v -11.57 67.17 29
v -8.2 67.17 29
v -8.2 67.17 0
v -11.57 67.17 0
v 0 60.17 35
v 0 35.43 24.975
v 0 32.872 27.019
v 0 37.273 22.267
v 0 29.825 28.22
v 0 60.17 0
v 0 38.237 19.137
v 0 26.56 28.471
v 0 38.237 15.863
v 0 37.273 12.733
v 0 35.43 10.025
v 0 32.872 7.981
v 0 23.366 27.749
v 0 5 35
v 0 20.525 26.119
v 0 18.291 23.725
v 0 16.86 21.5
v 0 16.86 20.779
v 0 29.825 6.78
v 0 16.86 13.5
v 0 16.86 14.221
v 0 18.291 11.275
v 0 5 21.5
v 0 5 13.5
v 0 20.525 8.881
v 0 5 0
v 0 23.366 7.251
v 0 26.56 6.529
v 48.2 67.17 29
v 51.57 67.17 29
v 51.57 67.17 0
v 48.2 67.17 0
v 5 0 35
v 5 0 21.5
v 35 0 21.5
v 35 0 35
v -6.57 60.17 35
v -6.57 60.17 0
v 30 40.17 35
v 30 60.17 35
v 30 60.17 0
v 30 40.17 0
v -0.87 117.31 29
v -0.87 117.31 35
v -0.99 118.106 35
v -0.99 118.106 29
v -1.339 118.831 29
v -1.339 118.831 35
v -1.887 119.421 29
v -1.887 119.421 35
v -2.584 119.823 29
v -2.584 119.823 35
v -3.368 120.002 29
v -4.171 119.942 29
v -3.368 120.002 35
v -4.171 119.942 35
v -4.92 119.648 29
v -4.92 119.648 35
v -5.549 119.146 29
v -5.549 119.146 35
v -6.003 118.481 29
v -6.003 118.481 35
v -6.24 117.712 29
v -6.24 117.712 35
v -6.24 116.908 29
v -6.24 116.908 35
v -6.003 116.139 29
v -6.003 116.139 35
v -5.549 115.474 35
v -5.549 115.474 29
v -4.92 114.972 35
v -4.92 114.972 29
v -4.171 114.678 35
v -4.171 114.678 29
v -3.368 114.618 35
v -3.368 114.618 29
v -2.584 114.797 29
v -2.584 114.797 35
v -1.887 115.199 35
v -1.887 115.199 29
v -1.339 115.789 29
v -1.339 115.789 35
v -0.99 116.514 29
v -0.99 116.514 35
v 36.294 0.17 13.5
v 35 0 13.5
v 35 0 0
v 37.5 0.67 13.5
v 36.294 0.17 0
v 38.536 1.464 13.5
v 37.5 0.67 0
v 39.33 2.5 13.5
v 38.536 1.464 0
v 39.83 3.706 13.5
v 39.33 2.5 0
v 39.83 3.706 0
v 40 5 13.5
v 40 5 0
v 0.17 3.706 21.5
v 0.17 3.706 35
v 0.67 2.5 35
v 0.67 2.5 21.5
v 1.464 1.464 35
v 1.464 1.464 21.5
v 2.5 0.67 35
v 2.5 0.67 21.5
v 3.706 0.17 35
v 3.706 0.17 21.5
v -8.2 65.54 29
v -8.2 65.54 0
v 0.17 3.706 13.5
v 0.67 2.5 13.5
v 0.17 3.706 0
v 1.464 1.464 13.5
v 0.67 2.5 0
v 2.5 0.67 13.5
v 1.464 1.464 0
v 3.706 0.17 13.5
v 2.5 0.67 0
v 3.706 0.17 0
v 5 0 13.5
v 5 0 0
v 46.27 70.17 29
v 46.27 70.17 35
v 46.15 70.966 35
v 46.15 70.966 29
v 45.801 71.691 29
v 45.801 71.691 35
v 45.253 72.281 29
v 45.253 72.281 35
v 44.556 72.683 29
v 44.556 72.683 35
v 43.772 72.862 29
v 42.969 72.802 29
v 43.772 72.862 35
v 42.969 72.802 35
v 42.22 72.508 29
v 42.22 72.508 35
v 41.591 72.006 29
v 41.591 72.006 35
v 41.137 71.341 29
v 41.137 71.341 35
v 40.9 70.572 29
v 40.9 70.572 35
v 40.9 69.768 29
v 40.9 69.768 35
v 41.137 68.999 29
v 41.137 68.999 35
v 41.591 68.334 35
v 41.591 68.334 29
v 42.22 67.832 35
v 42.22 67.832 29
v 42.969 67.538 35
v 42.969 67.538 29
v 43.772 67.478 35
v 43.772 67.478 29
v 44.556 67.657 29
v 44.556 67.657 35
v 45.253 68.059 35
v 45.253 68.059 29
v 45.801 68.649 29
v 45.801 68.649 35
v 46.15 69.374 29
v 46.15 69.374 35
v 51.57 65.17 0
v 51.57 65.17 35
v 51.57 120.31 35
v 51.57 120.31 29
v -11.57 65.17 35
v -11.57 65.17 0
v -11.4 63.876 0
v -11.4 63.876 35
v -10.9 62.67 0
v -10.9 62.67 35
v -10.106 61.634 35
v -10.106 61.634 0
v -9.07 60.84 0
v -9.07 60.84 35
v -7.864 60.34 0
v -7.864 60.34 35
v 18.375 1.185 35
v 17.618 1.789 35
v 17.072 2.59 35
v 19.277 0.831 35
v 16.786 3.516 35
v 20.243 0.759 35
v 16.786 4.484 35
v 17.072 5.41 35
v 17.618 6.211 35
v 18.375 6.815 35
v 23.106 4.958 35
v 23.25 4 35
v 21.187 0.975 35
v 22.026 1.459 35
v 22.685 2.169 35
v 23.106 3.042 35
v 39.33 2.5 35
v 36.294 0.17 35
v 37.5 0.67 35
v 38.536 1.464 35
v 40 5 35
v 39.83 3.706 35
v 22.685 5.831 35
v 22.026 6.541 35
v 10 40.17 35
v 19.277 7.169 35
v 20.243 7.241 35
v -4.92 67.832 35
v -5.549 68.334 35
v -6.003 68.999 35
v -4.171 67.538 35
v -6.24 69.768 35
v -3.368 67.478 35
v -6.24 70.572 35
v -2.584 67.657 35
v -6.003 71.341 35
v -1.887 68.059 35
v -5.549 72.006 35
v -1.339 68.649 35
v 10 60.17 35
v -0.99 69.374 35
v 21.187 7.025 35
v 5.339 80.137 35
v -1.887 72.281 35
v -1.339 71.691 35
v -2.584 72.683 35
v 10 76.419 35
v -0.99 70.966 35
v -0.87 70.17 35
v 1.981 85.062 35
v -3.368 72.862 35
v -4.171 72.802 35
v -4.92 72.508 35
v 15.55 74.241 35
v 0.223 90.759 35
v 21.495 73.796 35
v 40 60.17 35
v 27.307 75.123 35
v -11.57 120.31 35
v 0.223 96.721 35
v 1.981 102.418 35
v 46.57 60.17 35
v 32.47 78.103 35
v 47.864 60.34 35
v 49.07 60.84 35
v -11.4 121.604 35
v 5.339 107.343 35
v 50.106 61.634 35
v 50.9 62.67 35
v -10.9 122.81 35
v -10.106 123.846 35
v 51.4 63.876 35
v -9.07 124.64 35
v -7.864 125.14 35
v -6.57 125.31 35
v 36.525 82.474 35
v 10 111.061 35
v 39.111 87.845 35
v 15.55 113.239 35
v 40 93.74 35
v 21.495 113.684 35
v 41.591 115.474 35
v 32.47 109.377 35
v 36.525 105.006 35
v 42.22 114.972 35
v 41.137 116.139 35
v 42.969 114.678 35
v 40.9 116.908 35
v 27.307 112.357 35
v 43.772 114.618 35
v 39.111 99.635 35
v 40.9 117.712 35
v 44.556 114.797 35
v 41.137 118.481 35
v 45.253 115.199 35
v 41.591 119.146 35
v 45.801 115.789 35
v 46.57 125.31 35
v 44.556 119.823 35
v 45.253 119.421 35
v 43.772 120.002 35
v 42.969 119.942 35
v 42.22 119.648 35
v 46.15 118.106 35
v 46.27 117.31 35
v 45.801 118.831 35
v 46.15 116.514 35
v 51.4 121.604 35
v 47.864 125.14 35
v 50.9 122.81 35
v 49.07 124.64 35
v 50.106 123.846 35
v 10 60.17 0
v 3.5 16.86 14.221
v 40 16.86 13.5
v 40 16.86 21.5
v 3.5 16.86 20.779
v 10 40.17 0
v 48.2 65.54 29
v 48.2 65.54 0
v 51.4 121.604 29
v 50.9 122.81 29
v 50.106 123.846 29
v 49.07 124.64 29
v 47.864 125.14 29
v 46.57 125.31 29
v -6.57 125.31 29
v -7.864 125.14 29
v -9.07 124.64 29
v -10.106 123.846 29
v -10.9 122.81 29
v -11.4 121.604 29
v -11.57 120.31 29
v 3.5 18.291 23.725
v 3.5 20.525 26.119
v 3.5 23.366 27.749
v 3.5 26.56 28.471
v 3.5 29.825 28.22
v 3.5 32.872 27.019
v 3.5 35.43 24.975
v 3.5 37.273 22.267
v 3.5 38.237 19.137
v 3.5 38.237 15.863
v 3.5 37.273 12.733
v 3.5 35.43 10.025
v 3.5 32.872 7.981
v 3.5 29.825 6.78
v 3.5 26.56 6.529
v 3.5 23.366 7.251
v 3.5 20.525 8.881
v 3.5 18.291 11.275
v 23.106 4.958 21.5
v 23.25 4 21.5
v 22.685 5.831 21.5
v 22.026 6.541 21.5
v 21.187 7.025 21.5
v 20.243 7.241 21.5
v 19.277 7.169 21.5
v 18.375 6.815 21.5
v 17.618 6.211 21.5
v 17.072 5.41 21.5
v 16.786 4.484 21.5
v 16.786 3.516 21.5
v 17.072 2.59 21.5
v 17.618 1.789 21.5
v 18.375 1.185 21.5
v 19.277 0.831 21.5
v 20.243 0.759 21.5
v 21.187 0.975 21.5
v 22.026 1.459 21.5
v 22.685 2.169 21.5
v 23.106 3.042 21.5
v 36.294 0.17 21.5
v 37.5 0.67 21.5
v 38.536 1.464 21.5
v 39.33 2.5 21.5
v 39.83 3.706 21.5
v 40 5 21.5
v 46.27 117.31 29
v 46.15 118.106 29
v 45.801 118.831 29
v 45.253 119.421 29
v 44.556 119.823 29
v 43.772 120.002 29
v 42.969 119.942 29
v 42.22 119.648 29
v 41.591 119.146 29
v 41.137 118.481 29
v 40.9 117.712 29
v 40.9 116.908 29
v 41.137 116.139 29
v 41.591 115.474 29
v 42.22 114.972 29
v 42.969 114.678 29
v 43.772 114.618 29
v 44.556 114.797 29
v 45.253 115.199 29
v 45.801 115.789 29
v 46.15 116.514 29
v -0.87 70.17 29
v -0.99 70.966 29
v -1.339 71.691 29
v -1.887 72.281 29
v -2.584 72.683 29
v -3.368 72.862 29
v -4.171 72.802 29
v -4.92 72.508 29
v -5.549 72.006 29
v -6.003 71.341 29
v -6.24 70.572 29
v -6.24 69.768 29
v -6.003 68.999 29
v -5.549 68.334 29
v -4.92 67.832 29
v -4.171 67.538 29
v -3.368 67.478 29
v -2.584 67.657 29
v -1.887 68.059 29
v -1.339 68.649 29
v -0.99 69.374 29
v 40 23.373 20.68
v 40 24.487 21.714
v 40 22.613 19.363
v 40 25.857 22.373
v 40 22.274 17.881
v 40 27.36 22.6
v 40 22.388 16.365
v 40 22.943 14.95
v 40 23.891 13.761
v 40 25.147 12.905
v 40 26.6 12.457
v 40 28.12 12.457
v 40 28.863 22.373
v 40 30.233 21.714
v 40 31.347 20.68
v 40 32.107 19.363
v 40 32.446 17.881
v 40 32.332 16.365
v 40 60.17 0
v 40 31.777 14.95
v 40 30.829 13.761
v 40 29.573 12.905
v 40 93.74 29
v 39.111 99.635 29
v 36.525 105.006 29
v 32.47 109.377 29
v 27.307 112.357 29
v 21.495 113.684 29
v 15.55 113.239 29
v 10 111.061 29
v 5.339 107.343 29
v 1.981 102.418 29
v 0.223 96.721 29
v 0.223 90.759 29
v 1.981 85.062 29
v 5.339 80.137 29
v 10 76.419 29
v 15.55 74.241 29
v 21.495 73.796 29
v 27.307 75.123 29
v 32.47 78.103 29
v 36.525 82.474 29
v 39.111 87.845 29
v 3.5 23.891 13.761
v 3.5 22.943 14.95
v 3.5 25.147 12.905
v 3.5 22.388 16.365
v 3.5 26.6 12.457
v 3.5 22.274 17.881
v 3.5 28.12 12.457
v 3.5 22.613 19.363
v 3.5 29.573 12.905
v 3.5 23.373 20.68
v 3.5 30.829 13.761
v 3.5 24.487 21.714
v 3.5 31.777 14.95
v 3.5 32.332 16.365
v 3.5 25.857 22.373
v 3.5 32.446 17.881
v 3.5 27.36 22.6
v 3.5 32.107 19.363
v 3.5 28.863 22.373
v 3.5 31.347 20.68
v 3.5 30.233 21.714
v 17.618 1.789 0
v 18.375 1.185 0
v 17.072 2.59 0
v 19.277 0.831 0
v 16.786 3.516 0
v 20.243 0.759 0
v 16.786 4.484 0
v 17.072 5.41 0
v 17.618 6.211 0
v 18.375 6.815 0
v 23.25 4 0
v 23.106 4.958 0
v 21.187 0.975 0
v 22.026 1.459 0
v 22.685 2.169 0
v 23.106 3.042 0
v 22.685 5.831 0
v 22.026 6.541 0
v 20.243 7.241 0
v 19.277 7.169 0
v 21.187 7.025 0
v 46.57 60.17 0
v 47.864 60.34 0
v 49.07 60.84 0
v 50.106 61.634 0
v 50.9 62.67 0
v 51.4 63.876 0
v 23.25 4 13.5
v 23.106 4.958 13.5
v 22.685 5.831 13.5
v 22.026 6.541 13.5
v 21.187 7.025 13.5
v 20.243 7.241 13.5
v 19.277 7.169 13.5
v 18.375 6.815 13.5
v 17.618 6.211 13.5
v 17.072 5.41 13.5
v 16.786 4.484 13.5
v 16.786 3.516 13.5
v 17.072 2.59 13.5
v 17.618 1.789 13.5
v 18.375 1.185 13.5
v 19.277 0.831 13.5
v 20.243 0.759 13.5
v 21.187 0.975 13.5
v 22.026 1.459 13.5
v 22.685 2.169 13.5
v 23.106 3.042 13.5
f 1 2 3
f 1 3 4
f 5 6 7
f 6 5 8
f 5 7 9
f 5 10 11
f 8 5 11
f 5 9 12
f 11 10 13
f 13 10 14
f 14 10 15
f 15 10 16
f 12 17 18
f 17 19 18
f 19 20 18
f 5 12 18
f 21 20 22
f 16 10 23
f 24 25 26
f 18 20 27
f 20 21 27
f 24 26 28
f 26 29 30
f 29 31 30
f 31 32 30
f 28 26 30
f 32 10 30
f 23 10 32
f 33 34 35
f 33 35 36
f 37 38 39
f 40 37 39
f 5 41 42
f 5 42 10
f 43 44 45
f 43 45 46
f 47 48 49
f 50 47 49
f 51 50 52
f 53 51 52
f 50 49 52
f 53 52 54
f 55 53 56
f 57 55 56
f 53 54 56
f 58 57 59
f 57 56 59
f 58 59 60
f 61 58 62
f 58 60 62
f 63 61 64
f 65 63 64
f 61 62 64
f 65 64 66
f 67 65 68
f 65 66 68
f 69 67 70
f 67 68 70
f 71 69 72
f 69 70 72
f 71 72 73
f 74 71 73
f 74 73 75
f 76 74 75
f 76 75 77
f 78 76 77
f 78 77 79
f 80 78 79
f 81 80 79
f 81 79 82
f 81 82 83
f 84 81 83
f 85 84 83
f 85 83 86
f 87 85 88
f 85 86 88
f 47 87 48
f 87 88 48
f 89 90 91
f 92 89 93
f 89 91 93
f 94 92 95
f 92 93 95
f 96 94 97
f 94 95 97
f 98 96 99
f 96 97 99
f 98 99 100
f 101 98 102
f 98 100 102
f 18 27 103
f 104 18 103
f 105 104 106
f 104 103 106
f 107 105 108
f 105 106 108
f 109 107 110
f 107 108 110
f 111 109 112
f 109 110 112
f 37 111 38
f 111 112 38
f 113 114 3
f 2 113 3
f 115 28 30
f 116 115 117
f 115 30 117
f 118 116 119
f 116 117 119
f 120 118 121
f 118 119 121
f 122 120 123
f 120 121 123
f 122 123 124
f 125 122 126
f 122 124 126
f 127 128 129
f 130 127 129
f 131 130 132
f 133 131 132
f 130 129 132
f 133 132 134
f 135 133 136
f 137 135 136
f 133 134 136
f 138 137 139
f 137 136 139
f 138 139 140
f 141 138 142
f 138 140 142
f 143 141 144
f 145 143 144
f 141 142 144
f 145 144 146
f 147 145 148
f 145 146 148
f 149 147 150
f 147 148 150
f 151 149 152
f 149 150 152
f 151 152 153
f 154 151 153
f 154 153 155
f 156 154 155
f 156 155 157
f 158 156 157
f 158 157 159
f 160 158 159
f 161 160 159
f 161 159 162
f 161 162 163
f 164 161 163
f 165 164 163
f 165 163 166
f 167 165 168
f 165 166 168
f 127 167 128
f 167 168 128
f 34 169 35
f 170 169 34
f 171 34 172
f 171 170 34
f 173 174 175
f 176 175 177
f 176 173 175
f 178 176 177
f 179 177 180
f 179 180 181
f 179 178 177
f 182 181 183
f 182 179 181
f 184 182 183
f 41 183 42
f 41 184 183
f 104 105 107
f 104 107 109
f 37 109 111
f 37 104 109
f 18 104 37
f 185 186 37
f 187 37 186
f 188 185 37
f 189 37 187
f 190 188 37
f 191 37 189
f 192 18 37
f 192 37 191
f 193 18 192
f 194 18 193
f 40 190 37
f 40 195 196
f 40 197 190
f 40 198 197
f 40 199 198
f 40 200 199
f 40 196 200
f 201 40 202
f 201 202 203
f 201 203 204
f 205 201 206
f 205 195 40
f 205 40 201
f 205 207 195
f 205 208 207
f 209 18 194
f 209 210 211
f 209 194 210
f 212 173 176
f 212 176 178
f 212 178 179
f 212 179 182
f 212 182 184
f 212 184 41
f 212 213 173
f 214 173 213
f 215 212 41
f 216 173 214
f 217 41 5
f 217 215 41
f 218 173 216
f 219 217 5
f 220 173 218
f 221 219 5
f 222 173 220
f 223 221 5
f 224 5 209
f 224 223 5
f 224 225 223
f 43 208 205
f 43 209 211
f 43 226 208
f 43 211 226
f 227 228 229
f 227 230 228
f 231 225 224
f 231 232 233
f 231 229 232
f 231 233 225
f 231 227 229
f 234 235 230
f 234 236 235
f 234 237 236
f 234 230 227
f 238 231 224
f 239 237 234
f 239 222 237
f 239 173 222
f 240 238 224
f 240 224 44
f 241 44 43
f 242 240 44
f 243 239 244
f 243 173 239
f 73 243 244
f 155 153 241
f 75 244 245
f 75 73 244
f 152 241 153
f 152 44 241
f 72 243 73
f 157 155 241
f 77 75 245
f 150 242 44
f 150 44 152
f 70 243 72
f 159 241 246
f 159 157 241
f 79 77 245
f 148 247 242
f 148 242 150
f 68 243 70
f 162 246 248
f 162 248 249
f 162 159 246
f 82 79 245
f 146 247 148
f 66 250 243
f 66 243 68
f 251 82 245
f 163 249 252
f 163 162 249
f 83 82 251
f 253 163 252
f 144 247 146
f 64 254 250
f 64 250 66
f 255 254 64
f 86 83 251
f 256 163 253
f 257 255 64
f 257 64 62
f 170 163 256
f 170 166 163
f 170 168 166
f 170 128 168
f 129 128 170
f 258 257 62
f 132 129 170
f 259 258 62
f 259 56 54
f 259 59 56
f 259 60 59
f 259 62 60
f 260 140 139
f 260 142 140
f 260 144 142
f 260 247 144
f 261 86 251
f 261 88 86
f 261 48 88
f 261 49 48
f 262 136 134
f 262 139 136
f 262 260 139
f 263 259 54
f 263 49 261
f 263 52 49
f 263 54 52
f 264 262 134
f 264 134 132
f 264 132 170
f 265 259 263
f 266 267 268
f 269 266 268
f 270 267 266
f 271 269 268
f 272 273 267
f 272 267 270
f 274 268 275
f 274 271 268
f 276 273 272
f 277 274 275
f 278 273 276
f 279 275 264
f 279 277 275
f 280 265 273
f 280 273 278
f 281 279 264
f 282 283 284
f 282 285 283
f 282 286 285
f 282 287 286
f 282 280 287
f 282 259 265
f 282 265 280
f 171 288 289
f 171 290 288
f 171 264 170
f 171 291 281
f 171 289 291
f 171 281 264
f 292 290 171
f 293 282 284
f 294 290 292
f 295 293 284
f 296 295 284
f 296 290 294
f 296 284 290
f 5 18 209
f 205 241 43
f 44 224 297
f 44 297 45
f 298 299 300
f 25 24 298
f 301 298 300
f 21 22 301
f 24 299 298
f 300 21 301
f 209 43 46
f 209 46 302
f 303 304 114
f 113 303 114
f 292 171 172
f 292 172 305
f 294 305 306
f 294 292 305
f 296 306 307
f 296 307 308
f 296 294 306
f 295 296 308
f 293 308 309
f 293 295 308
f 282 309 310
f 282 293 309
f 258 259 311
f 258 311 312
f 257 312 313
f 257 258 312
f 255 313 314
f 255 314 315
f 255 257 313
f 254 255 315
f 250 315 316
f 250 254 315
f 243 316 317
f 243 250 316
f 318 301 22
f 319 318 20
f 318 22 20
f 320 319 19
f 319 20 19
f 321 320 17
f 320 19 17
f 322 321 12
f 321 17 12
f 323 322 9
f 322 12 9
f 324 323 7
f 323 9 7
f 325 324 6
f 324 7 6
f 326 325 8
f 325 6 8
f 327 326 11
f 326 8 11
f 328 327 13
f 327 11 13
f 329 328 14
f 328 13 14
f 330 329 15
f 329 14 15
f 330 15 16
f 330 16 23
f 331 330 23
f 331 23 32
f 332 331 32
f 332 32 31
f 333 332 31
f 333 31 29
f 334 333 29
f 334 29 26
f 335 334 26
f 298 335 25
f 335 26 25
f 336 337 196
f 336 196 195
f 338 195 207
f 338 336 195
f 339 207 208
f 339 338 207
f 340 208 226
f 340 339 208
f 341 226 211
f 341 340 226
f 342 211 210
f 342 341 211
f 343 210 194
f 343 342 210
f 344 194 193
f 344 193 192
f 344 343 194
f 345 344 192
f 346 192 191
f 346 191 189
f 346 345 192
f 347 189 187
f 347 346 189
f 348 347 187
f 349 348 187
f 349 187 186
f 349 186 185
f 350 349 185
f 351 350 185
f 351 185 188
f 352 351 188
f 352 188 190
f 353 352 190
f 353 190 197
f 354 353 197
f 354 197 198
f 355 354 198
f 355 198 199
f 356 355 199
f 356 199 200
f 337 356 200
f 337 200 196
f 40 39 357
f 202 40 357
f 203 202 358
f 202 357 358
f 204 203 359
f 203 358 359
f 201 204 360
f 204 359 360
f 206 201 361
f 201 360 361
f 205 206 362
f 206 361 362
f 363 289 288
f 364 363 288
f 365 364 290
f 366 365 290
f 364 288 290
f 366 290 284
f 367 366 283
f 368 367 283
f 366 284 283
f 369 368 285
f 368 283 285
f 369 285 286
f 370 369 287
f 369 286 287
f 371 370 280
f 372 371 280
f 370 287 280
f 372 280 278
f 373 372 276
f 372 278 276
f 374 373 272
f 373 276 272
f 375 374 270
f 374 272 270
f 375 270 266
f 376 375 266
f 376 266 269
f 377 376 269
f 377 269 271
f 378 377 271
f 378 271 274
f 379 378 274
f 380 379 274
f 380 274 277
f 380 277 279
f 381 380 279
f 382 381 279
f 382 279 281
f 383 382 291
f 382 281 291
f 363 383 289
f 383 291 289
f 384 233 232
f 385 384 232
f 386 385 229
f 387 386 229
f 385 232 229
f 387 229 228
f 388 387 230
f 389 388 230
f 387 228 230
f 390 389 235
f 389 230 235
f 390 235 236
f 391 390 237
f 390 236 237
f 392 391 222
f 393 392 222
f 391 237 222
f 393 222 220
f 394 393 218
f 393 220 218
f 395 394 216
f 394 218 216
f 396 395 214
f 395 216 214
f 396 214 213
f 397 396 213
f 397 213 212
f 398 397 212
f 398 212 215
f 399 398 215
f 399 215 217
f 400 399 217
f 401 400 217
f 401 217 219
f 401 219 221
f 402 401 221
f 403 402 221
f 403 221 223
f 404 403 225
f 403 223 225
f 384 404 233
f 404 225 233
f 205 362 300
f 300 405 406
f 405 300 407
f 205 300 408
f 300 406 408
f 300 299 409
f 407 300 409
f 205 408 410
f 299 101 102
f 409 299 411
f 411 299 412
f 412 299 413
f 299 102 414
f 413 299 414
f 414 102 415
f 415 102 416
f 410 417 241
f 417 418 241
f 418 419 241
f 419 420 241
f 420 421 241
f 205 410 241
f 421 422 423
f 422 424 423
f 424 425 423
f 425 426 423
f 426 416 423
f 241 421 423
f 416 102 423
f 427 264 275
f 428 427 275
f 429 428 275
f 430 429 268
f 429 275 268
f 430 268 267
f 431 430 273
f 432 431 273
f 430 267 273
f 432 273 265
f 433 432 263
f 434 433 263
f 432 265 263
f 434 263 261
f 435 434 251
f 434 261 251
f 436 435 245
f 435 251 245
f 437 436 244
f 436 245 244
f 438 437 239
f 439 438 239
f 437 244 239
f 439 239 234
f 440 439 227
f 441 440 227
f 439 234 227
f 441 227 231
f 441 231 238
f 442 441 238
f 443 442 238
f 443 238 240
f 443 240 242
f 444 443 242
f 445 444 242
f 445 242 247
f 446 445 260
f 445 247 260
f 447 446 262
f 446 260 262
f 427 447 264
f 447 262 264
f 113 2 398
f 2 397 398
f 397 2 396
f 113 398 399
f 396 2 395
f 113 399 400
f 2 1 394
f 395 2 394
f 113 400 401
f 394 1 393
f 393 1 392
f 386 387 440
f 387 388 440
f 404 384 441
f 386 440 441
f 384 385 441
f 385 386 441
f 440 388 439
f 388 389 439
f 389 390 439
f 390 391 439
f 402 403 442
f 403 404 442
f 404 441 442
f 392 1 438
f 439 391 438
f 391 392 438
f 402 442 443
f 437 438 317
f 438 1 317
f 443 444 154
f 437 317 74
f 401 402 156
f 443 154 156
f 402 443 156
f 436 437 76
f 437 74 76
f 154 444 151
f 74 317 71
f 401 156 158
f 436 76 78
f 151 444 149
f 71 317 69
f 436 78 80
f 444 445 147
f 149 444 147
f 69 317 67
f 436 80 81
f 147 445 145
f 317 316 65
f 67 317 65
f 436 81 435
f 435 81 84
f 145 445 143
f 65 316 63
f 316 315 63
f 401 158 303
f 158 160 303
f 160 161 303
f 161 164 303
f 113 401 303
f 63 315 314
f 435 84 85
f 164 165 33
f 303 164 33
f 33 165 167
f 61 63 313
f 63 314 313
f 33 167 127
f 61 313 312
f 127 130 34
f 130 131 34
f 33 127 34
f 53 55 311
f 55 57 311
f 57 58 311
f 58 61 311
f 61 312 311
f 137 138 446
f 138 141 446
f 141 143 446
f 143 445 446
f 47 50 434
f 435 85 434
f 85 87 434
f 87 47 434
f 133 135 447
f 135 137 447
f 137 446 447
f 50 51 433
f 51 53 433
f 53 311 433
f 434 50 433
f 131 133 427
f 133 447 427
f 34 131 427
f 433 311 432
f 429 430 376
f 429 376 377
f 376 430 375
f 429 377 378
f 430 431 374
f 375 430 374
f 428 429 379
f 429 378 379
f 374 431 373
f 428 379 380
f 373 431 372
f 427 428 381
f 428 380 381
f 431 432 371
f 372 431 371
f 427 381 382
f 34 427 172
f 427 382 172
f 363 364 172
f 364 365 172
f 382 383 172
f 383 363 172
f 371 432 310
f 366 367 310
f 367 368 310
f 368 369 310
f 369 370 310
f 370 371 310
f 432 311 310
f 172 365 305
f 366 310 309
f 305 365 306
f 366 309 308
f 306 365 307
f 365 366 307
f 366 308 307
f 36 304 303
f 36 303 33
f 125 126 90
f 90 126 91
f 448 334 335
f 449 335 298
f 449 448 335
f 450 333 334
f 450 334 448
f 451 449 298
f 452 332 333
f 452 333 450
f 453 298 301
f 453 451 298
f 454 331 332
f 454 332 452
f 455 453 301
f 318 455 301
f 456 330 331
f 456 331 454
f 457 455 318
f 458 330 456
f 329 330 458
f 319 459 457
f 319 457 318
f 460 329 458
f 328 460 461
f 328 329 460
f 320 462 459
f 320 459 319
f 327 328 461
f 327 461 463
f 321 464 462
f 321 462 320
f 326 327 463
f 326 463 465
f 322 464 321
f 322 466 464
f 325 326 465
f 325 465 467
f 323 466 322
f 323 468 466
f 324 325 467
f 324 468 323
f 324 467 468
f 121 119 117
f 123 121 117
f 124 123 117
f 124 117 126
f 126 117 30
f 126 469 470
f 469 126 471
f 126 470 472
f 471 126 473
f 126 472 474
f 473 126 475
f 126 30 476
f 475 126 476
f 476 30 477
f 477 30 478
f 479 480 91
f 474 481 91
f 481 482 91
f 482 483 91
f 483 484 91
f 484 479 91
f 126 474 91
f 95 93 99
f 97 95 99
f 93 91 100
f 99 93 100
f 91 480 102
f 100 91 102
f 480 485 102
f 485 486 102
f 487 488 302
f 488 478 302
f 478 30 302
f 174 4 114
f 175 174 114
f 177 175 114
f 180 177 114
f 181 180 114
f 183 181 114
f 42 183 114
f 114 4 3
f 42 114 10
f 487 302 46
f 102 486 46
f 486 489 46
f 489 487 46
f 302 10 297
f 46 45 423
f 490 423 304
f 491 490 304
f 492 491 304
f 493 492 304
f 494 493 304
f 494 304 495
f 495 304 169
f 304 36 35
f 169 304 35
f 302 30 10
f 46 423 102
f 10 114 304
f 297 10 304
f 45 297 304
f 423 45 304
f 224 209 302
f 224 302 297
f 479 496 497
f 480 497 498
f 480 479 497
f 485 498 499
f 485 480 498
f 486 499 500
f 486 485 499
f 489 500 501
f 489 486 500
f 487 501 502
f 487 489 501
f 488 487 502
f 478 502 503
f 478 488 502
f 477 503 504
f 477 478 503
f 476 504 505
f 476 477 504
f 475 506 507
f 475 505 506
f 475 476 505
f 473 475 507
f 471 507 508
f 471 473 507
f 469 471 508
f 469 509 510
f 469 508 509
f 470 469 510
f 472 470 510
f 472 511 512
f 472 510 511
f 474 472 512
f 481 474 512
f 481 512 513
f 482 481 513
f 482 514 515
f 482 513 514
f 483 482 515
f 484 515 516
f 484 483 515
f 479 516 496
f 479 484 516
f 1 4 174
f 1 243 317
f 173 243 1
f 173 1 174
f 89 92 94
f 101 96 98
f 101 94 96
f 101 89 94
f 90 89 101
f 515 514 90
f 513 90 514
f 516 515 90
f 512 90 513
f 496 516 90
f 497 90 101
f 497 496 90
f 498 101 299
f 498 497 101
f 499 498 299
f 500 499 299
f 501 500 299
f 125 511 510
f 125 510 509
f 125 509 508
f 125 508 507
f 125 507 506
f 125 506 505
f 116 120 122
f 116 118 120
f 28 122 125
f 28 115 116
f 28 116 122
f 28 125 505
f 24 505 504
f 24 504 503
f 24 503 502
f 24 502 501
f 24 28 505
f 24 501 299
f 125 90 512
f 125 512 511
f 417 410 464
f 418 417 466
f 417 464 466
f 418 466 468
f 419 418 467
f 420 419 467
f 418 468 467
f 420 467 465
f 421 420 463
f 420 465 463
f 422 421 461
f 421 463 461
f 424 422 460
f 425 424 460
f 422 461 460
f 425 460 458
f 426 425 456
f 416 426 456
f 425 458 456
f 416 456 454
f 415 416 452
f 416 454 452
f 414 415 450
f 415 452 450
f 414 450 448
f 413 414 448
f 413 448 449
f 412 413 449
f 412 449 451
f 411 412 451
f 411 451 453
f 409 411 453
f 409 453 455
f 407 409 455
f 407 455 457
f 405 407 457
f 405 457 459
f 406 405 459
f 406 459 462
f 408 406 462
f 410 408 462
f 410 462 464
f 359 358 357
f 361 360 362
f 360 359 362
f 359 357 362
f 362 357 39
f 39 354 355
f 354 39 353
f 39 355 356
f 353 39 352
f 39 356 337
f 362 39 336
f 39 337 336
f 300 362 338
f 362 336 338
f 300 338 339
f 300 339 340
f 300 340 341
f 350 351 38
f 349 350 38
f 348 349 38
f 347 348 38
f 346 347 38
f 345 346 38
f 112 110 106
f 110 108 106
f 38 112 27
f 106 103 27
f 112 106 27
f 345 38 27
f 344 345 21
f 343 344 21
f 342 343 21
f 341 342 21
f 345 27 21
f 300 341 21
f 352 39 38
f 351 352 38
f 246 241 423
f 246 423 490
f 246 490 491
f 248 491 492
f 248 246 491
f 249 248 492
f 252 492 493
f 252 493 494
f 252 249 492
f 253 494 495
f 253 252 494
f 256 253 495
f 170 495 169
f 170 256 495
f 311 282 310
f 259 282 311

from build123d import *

# Parameters (mm, degrees)
CROQUIS1_R                   = 3.25
SALIENTE_EXTRUIR1_DEPTH      = 35
CROQUIS3_R                   = 5.1
CROQUIS3_W                   = 8
CROQUIS3_H                   = 16.86
CORTAR_EXTRUIR2_DEPTH        = 85.095950556
CROQUIS4_R                   = 11
CORTAR_EXTRUIR3_DEPTH        = 3.5
CROQUIS5_R                   = 20
CROQUIS5_R_2                 = 2.7
SALIENTE_EXTRUIR3_DEPTH      = 6
SALIENTE_EXTRUIR5_DEPTH      = 29
SALIENTE_EXTRUIR5_DEPTH_BACK = 6
CROQUIS9_W                   = 56.4
CROQUIS9_H                   = 56.4
CORTAR_EXTRUIR4_DEPTH        = 29


with BuildPart() as part:
    # Croquis1 → Saliente-Extruir1 (new body)
    # profile 1 of 2: a face of its own
    with BuildSketch(Plane.XY):
        with BuildLine():
            Line((0, 60.17), (0, 40.17))
            Line((0, 40.17), (10, 40.17))
            Line((10, 40.17), (10, 60.17))
            Line((10, 60.17), (30, 60.17))
            Line((30, 60.17), (30, 40.17))
            Line((30, 40.17), (40, 40.17))
            Line((40, 40.17), (40, 60.17))
            ThreePointArc((40, 60.17), (38.535533906, 63.705533906), (35, 65.17))
            Line((35, 65.17), (5, 65.17))
            ThreePointArc((5, 65.17), (1.464466094, 63.705533906), (0, 60.17))
        make_face()
    # profile 2 of 2: a face of its own
    with BuildSketch(Plane.XY):
        with BuildLine():
            Line((5, 0), (35, 0))
            ThreePointArc((35, 0), (38.535533906, 1.464466094), (40, 5))
            Line((40, 5), (40, 40.17))
            Line((40, 40.17), (0, 40.17))
            Line((0, 40.17), (0, 5))
            ThreePointArc((0, 5), (1.464466094, 1.464466094), (5, 0))
        make_face()
        with Locations((20, 4)):
            Circle(CROQUIS1_R, mode=Mode.SUBTRACT)
    extrude(amount=SALIENTE_EXTRUIR1_DEPTH)

    # Croquis3 → Cortar-Extruir2 (cut, through all)
    with BuildSketch(Plane.ZY):
        with Locations((17.5, 27.36)):
            Circle(CROQUIS3_R)
        with Locations((17.5, 8.43)):
            Rectangle(CROQUIS3_W, CROQUIS3_H)
    extrude(amount=-CORTAR_EXTRUIR2_DEPTH, mode=Mode.SUBTRACT)

    # Croquis4 → Cortar-Extruir3 (cut)
    with BuildSketch(Plane.ZY):
        with Locations((17.5, 27.36)):
            Circle(CROQUIS4_R)
    extrude(amount=-CORTAR_EXTRUIR3_DEPTH, mode=Mode.SUBTRACT)

    # Croquis5 → Saliente-Extruir3 (add)
    with BuildSketch(Plane.XY.offset(35)):
        with BuildLine():
            Line((-11.57, 120.31), (-11.57, 67.17))
            ThreePointArc((-11.57, 67.17), (-10.105533906, 63.634466094), (-6.57, 62.17))
            Line((-6.57, 62.17), (46.57, 62.17))
            ThreePointArc((46.57, 62.17), (50.105533906, 63.634466094), (51.57, 67.17))
            Line((51.57, 67.17), (51.57, 120.31))
            ThreePointArc((51.57, 120.31), (50.105533906, 123.845533906), (46.57, 125.31))
            Line((46.57, 125.31), (-6.57, 125.31))
            ThreePointArc((-6.57, 125.31), (-10.105533906, 123.845533906), (-11.57, 120.31))
        make_face()
        with Locations((20, 93.74)):
            Circle(CROQUIS5_R, mode=Mode.SUBTRACT)
        with Locations((-3.57, 117.31)):
            Circle(CROQUIS5_R_2, mode=Mode.SUBTRACT)
        with Locations((43.57, 117.31)):
            Circle(CROQUIS5_R_2, mode=Mode.SUBTRACT)
        with Locations((43.57, 70.17)):
            Circle(CROQUIS5_R_2, mode=Mode.SUBTRACT)
        with Locations((-3.57, 70.17)):
            Circle(CROQUIS5_R_2, mode=Mode.SUBTRACT)
    extrude(amount=-SALIENTE_EXTRUIR3_DEPTH)

    # Croquis8 → Saliente-Extruir5 (add, two sides: drawn at the far end of the back side and taken through both)
    with BuildSketch(Plane(origin=(0, 0, 29), x_dir=(-1, 0, 0), z_dir=(0, 0, -1)).offset(-SALIENTE_EXTRUIR5_DEPTH_BACK)):
        with BuildLine():
            Line((6.57, 60.17), (-46.57, 60.17))
            ThreePointArc((-46.57, 60.17), (-50.105533906, 61.634466094), (-51.57, 65.17))
            Line((-51.57, 65.17), (-51.57, 67.17))
            Line((-51.57, 67.17), (11.57, 67.17))
            Line((11.57, 67.17), (11.57, 65.17))
            ThreePointArc((11.57, 65.17), (10.105533906, 61.634466094), (6.57, 60.17))
        make_face()
    extrude(amount=SALIENTE_EXTRUIR5_DEPTH + SALIENTE_EXTRUIR5_DEPTH_BACK)

    # Croquis9 → Cortar-Extruir4 (cut)
    with BuildSketch(Plane(origin=(0, 0, 0), x_dir=(-1, 0, 0), z_dir=(0, 0, -1))):
        with Locations((-20, 93.74)):
            Rectangle(CROQUIS9_W, CROQUIS9_H)
    extrude(amount=-CORTAR_EXTRUIR4_DEPTH, mode=Mode.SUBTRACT)


solid = part.part
